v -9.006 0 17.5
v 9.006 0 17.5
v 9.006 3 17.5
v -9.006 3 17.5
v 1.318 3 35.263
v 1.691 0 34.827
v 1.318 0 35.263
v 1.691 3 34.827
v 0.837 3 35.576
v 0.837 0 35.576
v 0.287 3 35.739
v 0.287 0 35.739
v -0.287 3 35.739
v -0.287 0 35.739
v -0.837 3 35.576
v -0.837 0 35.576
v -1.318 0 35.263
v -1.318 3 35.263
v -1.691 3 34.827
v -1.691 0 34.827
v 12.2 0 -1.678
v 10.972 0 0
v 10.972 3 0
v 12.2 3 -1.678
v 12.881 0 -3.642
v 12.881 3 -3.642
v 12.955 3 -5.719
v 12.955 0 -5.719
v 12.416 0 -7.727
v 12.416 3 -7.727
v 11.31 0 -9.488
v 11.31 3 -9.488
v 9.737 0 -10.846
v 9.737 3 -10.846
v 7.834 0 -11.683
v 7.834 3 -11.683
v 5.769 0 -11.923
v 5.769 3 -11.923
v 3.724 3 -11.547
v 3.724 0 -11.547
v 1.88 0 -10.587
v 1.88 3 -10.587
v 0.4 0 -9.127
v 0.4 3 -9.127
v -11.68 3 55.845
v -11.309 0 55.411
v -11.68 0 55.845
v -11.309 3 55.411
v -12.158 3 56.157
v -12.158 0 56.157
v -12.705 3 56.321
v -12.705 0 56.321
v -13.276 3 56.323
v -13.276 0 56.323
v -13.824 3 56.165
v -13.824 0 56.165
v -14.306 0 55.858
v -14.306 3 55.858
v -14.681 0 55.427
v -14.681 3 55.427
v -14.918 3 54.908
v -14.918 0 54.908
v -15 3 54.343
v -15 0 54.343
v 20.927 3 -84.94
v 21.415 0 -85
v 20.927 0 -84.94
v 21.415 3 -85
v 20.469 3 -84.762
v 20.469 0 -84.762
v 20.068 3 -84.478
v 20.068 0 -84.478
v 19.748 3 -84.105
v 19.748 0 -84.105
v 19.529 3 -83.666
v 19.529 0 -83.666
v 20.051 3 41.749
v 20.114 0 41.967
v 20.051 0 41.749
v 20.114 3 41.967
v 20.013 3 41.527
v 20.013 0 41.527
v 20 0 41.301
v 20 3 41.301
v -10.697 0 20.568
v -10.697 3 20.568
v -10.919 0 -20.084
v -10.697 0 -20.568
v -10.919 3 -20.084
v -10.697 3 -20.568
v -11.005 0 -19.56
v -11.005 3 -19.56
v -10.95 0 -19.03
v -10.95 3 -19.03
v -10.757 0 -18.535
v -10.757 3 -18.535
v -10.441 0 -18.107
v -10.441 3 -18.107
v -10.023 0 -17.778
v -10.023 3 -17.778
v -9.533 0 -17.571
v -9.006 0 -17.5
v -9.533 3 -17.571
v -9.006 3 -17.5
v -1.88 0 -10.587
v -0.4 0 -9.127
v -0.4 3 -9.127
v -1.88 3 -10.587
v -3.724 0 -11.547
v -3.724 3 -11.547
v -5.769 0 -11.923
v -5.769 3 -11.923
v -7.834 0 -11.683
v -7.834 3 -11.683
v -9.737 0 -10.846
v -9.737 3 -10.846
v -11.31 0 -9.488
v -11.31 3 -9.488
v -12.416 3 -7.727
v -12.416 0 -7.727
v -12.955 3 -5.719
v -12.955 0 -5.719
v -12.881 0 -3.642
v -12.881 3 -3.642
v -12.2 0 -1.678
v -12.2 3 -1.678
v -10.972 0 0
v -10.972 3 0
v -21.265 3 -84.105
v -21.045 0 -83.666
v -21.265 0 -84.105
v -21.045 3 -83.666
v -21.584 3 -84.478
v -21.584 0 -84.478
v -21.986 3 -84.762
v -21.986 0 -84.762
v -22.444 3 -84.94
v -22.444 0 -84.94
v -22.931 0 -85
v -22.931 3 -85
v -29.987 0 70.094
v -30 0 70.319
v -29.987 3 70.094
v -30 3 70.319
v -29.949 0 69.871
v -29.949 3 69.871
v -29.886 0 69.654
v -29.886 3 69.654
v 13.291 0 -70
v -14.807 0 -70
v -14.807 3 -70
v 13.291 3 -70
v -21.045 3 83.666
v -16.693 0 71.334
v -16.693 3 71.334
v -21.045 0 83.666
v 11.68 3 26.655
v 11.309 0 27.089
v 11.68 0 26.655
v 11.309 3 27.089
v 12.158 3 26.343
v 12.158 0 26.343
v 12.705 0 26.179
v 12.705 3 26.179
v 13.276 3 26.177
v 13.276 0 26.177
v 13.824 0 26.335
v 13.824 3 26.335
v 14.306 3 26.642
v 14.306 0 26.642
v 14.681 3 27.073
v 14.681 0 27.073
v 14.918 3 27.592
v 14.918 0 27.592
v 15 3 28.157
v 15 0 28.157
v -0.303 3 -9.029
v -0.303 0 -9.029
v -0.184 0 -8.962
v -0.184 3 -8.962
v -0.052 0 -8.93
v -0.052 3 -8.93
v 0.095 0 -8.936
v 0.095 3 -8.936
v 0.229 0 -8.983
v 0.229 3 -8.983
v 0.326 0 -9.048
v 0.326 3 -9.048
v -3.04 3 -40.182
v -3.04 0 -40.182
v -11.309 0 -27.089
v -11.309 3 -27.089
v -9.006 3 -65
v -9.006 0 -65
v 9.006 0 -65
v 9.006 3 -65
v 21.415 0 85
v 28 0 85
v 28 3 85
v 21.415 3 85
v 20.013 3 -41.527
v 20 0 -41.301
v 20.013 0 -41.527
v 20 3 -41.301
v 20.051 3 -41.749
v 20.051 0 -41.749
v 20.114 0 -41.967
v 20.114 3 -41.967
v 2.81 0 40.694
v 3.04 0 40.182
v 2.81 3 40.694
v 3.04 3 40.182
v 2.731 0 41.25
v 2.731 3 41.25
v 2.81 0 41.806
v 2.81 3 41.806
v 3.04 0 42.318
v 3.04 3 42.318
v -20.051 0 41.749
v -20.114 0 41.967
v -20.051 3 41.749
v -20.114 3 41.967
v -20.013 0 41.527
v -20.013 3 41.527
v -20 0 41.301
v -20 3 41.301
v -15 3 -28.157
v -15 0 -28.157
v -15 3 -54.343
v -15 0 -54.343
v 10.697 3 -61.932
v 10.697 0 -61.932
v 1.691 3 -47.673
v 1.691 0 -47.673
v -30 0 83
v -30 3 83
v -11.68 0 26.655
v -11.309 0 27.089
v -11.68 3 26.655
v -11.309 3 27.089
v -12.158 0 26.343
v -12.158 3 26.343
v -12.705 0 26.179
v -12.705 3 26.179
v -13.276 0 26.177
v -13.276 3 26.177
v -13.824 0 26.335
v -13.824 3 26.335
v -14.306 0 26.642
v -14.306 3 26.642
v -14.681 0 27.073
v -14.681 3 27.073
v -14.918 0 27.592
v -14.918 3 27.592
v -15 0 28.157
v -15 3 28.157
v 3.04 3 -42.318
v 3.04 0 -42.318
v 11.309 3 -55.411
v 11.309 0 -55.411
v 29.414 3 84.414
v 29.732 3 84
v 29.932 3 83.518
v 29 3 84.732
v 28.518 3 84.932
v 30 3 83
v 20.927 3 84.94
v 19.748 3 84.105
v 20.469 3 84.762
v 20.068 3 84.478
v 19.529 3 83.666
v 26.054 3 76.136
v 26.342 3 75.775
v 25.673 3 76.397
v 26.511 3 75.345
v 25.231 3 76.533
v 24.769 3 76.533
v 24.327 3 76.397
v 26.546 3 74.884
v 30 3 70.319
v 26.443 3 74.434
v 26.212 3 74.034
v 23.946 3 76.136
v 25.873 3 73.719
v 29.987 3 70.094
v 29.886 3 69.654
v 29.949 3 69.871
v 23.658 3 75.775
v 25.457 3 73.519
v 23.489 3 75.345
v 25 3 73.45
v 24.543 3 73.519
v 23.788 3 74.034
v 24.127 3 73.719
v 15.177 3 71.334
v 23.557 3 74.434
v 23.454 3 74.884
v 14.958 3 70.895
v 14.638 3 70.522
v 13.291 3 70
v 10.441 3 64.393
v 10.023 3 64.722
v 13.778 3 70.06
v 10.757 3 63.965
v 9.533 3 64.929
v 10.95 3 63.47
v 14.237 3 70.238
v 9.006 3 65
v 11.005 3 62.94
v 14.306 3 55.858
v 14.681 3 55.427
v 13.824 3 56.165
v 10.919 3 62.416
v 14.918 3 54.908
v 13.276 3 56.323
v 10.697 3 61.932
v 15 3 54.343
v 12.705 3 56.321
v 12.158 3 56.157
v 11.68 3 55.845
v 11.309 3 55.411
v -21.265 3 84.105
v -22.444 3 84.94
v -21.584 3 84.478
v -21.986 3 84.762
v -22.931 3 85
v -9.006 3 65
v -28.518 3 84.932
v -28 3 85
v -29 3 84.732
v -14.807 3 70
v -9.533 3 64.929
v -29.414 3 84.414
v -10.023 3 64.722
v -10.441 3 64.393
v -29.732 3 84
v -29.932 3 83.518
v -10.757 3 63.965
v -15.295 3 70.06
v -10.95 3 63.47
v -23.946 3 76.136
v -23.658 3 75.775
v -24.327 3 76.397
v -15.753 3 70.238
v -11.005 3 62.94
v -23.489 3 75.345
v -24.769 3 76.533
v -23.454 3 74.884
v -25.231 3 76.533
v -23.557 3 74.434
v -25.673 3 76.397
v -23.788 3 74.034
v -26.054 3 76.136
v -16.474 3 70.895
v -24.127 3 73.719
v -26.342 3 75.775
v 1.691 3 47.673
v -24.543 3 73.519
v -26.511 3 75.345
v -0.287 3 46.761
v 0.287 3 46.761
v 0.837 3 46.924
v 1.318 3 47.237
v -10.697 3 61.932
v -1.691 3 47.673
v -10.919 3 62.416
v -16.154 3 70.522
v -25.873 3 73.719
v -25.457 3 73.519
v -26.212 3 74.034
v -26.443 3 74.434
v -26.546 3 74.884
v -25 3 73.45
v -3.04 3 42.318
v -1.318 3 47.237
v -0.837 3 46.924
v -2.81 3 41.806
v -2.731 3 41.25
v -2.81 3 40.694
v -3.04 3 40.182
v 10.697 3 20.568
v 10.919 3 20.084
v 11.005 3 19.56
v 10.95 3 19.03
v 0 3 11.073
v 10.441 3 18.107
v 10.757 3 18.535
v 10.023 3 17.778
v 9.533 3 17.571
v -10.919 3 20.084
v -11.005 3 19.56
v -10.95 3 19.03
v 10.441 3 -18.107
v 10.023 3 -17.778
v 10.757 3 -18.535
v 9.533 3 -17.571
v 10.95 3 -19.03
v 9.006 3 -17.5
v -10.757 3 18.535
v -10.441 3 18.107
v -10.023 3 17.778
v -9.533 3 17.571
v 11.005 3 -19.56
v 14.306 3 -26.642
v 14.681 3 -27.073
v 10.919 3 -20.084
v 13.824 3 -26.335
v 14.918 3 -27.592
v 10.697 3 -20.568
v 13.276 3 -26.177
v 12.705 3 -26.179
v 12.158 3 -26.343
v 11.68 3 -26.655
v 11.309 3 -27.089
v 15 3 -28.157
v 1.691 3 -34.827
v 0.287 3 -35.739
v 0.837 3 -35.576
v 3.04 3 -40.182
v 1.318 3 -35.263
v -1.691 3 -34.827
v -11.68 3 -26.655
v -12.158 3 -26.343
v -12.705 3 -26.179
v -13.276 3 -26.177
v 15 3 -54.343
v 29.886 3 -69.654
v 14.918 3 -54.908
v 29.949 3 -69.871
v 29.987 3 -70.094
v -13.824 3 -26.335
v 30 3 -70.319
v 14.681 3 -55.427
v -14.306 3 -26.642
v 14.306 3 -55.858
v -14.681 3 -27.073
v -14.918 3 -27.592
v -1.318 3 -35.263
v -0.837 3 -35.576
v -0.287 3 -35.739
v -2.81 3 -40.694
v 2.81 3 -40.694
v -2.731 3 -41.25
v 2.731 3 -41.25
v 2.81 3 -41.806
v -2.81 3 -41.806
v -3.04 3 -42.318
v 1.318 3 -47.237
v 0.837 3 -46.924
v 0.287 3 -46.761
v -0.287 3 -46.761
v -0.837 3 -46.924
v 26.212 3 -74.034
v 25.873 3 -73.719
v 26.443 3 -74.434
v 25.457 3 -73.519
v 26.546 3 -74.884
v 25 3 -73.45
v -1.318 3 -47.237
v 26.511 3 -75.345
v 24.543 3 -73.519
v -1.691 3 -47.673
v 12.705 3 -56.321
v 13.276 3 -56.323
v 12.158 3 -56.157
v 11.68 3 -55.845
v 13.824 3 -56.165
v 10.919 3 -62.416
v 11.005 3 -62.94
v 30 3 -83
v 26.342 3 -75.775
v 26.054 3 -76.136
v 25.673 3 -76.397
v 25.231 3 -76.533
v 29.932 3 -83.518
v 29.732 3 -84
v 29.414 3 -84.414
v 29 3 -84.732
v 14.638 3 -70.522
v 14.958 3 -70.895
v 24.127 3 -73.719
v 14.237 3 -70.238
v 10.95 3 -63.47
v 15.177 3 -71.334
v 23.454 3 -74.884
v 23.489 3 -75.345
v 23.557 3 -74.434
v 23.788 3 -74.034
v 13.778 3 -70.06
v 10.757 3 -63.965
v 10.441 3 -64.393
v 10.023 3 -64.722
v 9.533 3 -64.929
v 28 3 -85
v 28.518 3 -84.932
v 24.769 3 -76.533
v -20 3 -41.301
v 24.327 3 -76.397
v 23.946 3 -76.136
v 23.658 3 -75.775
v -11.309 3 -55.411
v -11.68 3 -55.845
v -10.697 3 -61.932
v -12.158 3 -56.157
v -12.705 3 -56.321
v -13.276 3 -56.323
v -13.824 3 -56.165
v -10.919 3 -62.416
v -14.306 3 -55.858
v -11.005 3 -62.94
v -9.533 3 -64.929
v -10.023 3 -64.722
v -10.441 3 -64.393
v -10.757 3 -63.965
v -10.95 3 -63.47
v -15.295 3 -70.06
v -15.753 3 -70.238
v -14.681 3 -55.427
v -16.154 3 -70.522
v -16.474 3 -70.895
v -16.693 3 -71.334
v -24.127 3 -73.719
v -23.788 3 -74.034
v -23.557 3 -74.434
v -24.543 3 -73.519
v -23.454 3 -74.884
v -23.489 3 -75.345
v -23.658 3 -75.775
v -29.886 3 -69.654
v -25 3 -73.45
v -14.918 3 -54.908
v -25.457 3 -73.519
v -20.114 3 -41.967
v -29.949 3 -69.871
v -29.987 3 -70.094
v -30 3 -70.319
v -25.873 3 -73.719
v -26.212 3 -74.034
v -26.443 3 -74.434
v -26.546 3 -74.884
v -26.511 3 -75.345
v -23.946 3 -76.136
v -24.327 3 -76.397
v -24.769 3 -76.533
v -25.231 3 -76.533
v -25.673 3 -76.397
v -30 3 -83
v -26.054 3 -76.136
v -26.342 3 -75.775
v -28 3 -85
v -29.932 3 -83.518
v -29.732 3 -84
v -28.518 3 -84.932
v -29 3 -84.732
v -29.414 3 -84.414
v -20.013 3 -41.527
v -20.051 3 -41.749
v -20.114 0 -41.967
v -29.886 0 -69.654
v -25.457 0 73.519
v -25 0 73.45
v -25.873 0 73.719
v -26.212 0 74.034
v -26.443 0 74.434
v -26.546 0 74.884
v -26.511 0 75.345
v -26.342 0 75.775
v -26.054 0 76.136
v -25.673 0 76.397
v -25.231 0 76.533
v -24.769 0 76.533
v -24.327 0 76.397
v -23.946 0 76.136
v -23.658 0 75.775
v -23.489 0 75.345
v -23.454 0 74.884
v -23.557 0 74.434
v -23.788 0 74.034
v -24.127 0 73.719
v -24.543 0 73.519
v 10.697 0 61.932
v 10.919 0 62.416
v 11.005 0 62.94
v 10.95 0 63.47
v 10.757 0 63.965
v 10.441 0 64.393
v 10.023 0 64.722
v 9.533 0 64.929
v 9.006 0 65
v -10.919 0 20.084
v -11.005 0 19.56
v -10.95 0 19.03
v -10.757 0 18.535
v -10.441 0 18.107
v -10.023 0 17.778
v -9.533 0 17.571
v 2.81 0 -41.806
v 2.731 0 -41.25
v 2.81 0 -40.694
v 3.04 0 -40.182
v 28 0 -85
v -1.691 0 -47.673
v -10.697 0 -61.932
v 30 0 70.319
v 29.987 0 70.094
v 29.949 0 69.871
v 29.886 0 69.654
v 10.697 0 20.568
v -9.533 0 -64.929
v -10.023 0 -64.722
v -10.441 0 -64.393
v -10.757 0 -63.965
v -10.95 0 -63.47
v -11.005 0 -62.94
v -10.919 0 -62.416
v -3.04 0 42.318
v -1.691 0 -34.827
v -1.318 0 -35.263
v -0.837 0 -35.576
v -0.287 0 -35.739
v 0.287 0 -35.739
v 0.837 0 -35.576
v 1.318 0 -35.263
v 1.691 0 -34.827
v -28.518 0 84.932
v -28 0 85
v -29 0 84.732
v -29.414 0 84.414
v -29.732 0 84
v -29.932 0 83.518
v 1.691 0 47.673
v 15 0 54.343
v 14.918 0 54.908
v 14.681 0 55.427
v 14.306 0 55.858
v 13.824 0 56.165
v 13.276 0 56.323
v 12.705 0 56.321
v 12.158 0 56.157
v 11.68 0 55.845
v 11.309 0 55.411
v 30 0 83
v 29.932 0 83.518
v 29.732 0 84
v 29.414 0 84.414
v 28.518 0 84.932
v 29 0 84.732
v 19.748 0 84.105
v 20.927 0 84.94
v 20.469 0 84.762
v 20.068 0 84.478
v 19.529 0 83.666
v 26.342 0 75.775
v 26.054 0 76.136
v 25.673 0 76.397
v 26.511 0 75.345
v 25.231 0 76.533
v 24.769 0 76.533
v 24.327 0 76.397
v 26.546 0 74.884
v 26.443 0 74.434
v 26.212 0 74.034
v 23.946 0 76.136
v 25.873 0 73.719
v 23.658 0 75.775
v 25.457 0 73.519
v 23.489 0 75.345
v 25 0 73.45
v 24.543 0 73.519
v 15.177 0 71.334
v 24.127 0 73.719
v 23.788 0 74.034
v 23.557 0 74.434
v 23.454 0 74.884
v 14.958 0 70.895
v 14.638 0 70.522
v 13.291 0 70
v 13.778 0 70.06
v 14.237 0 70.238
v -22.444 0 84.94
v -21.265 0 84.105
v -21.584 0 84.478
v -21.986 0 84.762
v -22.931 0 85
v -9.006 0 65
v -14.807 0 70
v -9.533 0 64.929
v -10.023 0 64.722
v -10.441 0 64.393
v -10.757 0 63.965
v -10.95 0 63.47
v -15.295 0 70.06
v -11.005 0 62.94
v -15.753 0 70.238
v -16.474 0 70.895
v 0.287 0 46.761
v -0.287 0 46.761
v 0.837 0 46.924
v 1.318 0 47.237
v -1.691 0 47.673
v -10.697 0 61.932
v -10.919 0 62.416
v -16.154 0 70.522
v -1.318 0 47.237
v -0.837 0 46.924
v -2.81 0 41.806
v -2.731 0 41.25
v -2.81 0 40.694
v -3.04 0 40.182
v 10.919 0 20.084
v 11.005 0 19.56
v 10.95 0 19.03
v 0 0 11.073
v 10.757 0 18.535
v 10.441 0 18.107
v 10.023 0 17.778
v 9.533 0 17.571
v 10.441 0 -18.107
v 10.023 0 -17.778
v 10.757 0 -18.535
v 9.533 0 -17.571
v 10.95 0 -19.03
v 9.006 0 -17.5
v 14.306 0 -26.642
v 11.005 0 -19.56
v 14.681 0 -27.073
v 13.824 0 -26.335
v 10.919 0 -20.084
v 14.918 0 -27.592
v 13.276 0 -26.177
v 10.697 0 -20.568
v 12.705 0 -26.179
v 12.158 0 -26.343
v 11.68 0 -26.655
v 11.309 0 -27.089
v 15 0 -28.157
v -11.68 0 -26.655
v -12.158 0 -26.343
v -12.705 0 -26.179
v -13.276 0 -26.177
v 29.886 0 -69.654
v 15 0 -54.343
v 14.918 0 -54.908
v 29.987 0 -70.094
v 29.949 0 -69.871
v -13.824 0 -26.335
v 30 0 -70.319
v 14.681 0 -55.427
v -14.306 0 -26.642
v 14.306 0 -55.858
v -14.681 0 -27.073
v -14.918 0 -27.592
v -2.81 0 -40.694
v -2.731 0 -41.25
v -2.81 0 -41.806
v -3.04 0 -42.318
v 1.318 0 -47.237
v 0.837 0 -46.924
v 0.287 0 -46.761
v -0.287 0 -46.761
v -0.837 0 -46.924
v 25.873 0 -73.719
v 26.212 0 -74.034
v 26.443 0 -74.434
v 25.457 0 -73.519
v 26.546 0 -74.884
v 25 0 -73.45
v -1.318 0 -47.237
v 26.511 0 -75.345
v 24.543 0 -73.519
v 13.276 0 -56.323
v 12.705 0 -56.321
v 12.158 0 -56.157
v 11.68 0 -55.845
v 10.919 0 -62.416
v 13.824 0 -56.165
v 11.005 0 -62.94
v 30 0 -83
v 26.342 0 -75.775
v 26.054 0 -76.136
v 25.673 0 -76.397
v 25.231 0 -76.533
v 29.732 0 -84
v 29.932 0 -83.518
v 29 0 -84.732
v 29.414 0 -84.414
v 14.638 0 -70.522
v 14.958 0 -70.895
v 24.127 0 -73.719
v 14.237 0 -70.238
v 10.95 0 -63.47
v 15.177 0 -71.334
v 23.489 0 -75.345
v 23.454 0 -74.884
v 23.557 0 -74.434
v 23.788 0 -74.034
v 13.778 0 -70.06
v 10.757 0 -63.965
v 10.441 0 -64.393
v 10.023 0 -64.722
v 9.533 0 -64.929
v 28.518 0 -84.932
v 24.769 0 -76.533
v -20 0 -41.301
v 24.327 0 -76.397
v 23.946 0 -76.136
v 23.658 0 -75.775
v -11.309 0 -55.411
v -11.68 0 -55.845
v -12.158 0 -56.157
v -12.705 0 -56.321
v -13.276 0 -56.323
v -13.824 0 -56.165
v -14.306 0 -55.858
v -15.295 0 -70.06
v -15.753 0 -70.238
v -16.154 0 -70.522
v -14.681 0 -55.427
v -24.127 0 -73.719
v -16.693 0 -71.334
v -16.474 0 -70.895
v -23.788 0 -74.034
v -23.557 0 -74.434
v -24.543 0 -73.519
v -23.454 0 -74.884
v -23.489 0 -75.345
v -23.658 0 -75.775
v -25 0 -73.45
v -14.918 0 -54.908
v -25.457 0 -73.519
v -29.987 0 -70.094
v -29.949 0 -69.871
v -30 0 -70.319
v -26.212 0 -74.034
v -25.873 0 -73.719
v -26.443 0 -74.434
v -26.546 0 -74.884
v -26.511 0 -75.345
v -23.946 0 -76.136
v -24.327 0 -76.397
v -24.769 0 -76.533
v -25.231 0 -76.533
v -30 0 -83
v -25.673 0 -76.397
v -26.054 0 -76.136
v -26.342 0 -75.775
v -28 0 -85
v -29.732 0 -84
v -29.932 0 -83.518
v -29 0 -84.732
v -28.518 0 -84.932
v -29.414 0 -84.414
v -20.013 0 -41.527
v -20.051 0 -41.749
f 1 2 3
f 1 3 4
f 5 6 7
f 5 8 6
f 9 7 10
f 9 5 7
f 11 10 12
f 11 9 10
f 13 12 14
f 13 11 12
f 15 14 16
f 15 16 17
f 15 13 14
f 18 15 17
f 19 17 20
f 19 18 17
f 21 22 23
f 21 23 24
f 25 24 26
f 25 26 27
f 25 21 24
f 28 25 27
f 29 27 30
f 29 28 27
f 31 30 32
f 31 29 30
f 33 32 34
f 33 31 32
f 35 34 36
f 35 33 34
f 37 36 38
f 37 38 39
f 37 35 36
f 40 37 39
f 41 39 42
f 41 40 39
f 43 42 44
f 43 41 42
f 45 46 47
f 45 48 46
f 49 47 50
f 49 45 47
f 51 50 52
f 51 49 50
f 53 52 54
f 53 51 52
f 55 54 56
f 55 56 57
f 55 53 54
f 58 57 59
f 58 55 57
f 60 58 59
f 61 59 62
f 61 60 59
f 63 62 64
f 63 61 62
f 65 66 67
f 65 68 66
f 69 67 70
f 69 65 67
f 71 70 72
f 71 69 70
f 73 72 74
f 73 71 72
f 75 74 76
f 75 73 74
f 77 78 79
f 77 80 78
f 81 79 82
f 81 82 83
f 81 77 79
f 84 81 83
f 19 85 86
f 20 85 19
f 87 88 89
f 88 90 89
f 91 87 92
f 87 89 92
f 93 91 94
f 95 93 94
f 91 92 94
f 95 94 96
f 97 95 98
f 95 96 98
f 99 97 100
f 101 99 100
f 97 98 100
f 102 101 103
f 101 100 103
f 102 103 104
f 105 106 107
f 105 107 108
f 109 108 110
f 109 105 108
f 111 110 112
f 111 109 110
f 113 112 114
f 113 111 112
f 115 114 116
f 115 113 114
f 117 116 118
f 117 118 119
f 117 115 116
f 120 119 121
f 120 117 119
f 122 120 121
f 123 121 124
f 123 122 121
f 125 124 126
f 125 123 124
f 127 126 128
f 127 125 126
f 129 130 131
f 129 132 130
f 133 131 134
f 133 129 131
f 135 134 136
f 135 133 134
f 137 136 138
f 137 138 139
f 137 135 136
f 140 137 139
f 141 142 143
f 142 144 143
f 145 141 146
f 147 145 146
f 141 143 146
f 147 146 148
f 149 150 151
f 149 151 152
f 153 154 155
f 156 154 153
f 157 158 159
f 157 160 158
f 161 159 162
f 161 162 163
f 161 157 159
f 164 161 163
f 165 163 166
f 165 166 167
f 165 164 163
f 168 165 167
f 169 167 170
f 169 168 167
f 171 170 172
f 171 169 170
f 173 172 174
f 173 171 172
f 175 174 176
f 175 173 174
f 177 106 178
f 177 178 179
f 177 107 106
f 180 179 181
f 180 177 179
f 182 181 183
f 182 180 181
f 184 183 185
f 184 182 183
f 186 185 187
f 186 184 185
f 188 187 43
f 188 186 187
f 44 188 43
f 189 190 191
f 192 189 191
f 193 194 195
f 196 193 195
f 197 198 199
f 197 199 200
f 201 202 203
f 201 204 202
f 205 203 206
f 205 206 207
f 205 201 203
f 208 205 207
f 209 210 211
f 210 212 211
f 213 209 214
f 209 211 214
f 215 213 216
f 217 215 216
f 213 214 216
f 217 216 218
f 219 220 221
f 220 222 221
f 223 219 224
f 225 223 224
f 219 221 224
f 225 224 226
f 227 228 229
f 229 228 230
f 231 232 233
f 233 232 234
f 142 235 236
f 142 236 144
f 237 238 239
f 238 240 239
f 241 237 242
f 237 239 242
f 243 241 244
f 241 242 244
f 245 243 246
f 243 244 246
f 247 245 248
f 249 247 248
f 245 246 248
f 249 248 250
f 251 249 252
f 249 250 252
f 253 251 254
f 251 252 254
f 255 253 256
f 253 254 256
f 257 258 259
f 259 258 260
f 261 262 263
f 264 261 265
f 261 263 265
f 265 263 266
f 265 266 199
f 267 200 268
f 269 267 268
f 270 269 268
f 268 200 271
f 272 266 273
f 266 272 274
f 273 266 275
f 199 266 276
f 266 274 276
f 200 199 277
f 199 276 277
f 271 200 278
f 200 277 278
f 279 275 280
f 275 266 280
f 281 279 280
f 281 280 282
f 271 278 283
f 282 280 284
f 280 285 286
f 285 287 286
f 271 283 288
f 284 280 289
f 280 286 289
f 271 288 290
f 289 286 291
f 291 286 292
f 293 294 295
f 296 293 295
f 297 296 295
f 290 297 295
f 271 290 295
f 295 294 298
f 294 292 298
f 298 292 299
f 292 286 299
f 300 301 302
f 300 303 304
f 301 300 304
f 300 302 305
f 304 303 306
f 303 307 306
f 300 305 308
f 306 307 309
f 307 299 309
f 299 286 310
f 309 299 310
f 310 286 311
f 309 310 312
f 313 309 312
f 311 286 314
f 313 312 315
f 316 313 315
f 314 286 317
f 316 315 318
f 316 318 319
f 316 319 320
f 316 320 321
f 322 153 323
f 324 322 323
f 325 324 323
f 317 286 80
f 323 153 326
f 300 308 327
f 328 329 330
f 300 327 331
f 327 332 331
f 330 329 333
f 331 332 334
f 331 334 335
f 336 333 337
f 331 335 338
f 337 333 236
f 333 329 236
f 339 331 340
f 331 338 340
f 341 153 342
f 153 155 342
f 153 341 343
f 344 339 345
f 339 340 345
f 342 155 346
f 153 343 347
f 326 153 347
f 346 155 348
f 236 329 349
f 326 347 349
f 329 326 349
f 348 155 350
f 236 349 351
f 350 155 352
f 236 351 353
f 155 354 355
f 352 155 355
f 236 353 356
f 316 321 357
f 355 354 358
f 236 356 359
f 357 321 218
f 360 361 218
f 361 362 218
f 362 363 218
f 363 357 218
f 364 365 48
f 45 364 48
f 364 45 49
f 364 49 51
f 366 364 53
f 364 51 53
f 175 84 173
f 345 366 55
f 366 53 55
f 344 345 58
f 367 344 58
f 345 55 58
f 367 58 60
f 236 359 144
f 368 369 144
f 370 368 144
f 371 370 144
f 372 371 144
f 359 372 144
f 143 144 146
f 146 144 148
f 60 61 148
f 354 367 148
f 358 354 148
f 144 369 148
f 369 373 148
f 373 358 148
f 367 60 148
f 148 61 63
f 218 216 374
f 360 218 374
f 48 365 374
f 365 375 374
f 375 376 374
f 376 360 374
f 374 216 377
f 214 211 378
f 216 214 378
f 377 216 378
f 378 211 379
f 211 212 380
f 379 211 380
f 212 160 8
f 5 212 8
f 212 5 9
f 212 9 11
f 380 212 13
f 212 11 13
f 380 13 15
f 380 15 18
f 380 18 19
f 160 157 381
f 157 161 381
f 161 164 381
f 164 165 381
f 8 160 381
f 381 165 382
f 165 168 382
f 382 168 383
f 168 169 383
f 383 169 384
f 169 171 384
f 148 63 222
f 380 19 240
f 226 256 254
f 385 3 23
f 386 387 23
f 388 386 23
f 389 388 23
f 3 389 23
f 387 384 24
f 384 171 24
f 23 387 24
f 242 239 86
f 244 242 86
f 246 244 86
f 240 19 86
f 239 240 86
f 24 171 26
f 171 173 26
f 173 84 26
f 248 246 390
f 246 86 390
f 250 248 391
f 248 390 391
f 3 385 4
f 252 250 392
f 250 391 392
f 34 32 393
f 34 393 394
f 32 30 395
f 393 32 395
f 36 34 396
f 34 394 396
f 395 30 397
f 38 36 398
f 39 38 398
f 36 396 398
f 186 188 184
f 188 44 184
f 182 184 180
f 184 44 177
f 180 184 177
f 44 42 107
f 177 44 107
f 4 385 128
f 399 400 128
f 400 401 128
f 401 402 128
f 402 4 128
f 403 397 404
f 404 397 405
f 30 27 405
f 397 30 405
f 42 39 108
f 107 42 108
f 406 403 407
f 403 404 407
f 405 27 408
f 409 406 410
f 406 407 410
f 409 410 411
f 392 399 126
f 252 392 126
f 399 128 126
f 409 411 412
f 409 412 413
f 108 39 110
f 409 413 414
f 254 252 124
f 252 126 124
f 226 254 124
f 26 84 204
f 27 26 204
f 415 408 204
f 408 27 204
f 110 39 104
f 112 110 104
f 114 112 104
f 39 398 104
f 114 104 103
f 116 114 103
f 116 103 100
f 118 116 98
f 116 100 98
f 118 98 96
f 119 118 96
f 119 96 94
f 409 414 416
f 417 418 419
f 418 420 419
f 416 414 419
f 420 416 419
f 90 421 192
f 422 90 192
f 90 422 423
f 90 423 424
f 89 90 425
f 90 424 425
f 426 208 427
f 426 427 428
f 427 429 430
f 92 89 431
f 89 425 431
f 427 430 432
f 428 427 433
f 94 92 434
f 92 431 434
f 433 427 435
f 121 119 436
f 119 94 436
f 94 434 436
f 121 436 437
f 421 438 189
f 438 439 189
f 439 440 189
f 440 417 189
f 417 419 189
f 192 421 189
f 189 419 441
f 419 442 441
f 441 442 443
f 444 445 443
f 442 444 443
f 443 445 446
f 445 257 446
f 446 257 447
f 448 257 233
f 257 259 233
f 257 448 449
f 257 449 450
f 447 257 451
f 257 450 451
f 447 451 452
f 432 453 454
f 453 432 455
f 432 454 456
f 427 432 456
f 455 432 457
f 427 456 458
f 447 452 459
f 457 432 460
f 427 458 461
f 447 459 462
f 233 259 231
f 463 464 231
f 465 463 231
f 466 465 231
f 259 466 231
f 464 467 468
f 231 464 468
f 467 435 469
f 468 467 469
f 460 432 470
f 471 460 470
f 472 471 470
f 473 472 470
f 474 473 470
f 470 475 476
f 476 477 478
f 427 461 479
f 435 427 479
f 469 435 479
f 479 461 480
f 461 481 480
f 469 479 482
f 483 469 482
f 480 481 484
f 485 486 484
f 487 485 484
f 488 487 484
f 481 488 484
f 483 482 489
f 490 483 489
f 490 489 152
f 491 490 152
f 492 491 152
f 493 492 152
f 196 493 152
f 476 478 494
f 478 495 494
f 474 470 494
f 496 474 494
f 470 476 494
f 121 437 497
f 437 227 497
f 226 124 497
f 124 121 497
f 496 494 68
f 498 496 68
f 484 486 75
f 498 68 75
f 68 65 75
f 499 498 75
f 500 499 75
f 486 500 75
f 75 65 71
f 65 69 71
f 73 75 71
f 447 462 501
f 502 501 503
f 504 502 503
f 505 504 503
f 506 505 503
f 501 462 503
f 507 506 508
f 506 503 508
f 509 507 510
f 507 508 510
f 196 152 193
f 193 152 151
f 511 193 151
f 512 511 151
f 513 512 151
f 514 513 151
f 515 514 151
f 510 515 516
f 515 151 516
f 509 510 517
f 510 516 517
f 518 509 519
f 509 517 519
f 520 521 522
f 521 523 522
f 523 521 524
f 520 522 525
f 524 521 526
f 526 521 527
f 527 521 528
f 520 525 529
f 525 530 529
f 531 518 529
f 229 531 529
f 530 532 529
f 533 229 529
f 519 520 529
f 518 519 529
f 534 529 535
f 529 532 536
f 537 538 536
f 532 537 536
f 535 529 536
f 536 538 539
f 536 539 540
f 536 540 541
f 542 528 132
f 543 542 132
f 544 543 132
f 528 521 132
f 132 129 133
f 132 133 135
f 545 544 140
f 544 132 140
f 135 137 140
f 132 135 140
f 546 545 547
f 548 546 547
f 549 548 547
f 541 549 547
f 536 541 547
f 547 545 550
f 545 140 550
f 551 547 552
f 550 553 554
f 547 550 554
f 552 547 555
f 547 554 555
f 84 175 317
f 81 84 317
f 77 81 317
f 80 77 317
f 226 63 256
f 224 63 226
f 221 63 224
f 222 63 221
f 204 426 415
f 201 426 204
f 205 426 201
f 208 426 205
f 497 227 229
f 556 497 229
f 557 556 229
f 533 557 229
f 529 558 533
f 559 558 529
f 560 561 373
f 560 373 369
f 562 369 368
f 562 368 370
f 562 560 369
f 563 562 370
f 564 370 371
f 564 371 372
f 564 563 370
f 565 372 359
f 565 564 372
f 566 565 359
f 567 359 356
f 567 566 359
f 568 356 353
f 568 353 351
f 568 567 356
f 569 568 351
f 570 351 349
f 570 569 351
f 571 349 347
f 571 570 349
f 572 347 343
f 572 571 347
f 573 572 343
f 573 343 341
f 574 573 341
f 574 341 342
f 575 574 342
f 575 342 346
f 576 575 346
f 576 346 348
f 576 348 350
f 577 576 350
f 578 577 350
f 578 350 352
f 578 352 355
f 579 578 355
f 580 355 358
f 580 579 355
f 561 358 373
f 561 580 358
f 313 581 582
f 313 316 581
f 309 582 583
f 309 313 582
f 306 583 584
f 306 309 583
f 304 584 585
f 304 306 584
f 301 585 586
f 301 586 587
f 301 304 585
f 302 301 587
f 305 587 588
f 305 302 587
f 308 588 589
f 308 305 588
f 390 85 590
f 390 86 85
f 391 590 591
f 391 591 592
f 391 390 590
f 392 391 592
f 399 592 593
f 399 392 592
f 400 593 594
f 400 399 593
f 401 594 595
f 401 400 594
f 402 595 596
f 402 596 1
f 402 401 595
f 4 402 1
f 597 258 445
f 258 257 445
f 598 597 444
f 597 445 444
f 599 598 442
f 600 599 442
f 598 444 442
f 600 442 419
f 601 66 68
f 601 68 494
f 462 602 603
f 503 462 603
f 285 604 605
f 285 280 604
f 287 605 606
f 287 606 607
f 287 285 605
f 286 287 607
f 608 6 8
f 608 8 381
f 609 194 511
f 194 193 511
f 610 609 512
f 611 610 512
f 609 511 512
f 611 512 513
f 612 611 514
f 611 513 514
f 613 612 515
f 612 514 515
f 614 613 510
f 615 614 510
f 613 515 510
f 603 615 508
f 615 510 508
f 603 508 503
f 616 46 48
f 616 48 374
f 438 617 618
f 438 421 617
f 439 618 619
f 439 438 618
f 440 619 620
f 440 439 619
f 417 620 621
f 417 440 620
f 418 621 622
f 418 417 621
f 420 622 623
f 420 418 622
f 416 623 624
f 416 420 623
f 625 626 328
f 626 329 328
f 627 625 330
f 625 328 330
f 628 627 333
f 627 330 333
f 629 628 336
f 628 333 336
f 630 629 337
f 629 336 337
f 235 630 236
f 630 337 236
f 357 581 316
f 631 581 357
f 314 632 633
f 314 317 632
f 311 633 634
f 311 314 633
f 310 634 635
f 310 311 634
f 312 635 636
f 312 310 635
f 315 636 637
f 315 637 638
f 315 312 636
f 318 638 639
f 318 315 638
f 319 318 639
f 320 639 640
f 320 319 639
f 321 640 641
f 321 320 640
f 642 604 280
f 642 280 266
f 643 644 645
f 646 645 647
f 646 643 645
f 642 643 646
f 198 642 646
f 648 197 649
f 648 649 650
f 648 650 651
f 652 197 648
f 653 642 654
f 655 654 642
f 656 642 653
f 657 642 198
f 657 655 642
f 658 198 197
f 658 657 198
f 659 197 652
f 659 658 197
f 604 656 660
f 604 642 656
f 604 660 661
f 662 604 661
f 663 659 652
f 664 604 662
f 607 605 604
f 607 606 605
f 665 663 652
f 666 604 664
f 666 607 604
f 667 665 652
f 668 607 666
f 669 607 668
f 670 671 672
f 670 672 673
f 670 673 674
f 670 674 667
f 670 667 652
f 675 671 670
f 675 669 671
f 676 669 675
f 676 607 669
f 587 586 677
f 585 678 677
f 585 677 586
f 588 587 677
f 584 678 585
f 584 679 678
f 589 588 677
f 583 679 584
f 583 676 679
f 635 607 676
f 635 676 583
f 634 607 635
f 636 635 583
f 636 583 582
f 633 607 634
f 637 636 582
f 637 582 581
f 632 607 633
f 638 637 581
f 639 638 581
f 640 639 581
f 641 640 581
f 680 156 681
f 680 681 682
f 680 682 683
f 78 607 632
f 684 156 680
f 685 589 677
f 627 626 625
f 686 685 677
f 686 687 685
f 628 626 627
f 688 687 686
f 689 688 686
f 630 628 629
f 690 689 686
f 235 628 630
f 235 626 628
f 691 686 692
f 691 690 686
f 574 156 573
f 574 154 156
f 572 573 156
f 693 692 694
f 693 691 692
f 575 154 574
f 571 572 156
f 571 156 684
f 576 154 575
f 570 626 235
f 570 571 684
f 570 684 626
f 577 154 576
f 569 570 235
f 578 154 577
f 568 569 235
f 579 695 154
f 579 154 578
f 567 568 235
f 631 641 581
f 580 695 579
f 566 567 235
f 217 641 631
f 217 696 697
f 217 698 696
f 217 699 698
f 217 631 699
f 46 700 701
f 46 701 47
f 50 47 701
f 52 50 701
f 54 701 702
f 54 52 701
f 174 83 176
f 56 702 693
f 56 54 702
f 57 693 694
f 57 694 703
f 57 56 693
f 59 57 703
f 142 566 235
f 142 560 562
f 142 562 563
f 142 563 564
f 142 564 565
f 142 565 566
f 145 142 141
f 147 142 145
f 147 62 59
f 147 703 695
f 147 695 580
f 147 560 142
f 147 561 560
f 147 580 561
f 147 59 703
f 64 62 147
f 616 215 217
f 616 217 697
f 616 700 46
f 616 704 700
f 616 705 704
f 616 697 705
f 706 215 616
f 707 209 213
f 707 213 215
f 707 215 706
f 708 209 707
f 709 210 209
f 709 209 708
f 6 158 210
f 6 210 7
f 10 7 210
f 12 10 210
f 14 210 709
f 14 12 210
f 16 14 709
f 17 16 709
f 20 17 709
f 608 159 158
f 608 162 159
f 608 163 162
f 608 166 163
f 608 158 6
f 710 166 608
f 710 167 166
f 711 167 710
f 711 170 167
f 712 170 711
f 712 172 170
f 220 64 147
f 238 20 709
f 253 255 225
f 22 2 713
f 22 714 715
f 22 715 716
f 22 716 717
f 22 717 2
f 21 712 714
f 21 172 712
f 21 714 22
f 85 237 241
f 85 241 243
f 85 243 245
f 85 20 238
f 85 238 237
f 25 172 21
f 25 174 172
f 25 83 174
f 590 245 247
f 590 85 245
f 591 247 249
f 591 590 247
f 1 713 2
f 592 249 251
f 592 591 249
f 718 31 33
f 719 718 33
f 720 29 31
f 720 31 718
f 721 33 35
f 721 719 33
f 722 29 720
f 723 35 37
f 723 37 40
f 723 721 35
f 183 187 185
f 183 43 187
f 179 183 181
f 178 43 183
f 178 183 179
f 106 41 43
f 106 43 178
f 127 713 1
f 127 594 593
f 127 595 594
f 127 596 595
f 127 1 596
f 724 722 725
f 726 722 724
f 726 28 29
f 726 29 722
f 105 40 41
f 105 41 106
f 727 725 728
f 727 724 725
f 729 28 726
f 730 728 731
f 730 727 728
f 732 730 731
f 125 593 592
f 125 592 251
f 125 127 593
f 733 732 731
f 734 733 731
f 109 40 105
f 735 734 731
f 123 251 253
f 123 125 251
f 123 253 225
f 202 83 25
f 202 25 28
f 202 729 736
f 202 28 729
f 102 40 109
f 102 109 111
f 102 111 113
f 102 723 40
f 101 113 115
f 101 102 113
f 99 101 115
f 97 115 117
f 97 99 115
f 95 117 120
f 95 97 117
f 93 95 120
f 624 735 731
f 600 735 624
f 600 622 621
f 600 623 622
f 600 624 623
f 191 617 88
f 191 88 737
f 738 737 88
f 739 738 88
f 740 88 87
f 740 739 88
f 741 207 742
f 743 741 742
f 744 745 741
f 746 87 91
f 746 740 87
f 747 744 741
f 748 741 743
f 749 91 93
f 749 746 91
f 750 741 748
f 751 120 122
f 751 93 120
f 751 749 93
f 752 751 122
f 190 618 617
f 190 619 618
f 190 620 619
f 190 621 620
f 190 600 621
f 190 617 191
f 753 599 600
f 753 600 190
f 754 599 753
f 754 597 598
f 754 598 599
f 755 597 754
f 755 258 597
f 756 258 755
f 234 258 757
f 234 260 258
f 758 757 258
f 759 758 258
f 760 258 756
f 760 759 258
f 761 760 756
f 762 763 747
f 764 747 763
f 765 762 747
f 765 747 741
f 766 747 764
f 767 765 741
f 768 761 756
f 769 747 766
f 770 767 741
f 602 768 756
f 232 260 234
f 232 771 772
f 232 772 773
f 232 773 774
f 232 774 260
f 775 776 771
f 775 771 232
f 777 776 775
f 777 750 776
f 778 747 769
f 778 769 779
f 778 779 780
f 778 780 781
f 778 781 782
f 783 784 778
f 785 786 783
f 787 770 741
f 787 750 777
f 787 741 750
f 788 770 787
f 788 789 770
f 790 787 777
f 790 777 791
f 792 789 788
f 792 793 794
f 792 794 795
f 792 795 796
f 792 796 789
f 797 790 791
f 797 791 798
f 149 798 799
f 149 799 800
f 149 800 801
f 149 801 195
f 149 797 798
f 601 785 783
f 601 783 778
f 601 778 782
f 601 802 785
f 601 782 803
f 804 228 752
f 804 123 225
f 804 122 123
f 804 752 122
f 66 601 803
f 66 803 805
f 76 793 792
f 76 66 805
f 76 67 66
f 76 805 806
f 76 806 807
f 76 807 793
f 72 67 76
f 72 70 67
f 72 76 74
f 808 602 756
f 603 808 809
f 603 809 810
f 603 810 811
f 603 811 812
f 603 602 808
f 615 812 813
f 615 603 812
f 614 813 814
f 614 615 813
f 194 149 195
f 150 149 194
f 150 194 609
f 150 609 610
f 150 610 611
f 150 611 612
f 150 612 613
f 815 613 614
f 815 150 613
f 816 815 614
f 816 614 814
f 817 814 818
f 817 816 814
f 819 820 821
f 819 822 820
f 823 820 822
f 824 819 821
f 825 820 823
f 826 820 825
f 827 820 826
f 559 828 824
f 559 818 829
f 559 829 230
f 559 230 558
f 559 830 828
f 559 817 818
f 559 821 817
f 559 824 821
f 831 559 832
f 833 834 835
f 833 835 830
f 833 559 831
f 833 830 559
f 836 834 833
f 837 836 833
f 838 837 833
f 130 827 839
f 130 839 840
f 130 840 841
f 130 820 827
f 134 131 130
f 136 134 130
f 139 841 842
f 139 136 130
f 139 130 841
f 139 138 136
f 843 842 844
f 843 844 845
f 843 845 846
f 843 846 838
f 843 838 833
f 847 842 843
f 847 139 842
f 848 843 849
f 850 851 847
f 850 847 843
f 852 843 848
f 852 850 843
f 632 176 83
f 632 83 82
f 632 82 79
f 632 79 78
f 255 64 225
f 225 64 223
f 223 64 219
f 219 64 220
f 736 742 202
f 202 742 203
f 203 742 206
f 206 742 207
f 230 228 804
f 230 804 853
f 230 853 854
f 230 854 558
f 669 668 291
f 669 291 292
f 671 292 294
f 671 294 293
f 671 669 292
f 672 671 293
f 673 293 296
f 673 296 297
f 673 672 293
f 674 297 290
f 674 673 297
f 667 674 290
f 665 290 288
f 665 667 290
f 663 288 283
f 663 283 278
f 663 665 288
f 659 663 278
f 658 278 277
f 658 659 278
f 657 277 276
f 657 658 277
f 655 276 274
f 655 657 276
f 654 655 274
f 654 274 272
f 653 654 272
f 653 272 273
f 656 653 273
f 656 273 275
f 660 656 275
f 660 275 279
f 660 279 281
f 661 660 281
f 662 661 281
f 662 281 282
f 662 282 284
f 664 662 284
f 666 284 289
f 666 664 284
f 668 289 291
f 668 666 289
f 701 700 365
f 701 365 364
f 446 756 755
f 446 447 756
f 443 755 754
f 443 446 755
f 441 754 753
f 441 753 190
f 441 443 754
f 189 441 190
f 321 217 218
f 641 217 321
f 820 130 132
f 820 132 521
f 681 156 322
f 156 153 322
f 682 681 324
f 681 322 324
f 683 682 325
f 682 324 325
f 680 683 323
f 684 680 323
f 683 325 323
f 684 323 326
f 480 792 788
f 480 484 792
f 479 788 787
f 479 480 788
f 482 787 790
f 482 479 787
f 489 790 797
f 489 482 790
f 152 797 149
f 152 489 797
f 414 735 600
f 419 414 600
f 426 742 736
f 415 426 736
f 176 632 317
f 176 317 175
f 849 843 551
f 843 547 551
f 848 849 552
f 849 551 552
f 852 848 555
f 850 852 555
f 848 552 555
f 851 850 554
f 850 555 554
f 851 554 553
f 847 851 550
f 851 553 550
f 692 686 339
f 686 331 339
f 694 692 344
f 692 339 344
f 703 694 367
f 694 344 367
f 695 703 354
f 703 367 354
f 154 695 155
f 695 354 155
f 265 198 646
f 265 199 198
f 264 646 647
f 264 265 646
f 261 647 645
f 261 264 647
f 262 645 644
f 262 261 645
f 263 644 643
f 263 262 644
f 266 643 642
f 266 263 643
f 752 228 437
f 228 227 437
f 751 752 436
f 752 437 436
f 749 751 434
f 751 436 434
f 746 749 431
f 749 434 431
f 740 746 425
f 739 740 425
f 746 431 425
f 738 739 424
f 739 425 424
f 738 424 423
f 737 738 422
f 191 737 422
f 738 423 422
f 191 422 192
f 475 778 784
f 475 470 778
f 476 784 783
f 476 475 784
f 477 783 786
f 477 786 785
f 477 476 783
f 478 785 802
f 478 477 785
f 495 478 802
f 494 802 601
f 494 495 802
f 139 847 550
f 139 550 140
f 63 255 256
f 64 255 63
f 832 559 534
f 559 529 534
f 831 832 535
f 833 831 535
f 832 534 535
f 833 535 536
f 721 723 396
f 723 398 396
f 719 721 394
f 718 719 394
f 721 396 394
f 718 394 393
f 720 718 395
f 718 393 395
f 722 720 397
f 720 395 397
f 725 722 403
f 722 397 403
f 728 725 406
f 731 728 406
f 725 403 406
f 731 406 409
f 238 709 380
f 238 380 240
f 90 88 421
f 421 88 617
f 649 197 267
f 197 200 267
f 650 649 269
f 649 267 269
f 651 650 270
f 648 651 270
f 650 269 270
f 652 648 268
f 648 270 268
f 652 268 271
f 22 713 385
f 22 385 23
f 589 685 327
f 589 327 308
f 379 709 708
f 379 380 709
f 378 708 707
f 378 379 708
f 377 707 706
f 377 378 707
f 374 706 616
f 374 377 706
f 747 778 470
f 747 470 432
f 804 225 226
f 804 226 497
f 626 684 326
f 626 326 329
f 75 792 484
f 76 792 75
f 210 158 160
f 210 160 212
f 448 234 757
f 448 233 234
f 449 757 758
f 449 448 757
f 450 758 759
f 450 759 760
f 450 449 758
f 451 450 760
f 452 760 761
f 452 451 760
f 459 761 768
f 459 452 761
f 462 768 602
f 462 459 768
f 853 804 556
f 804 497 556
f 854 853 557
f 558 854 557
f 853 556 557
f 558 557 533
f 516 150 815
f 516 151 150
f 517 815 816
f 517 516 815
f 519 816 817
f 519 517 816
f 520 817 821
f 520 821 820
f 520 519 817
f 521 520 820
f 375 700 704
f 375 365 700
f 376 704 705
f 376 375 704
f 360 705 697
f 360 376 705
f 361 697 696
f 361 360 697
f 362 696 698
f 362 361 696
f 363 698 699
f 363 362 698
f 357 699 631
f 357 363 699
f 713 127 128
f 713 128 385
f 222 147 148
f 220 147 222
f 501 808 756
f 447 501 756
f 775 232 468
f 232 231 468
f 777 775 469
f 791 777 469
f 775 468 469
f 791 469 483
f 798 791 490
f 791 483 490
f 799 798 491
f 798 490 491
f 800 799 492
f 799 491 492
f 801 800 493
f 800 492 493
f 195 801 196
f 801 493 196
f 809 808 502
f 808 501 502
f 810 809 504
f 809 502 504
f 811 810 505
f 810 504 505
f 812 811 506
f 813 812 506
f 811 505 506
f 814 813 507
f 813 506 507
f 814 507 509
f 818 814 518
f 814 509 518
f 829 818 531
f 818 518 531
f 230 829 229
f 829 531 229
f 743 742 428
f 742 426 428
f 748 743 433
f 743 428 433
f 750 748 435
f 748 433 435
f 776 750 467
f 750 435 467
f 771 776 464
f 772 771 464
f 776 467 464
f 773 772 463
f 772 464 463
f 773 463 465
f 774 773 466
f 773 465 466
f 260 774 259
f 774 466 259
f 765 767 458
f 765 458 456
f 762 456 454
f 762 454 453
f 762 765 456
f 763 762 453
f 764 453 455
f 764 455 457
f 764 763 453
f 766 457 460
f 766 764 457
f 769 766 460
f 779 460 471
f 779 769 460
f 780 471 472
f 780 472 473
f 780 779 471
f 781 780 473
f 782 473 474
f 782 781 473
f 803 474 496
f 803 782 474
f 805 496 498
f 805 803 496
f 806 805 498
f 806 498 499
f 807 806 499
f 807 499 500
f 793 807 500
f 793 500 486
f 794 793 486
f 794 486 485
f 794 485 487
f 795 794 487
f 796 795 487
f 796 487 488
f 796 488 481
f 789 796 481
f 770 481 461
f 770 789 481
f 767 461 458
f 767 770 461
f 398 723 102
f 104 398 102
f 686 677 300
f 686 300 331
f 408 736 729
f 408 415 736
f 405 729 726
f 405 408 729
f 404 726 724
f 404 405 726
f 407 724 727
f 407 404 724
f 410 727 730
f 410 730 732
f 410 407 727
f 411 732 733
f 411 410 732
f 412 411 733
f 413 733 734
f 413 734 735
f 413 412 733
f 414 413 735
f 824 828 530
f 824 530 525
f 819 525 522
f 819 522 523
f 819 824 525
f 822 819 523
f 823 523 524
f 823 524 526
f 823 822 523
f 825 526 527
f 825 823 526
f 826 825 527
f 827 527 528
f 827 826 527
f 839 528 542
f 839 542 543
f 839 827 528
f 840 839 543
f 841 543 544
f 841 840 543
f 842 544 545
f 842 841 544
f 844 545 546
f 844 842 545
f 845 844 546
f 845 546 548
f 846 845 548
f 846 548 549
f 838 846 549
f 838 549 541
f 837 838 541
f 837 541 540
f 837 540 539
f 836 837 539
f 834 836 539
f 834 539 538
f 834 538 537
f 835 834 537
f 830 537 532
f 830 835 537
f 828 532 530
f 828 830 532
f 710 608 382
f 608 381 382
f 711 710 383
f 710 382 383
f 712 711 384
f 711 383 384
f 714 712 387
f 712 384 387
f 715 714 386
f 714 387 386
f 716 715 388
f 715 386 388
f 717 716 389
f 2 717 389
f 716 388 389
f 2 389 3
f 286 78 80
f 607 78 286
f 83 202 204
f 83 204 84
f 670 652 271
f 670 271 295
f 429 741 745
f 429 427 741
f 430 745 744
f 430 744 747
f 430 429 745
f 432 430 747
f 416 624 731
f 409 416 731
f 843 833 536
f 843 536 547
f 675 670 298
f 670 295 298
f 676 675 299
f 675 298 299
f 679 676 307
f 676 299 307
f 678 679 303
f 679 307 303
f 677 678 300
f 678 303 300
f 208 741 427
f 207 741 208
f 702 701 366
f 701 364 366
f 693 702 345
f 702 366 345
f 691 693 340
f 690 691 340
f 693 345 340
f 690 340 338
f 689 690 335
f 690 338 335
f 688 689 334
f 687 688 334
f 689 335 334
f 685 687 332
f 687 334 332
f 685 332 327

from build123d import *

# Parameters (mm, degrees)
SKETCH_1_R      = 1.55
EXTRUDE_1_DEPTH = 3
FILLET_1_R      = 2
FILLET_2_R      = 0.5


with BuildPart() as part:
    # 草图1 → 凸台-拉伸1 (new body)
    with BuildSketch(Plane(origin=(0, 0, 0), x_dir=(1, 0, 0), z_dir=(0, 1, 0))):
        Polygon((30, -85), (20, -85), (14.705882353, -70), (-16.222232293, -70), (-21.51634994, -85), (-30, -85), (-30, -69.976869686), (-20, -41.643536352), (-20, 41.643536352), (-30, 69.976869686), (-30, 85), (-21.51634994, 85), (-16.222232293, 70), (14.705882353, 70), (20, 85), (30, 85), (30, 69.976869686), (20, 41.643536352), (20, -41.643536352), (30, -69.976869686), align=None)
        with Locations(Location((-25, 75, 0), (0, 0, 270))):
            Circle(SKETCH_1_R, mode=Mode.SUBTRACT)
        with Locations(Location((25, 75, 0), (0, 0, 270))):
            Circle(SKETCH_1_R, mode=Mode.SUBTRACT)
        with Locations(Location((25, -75, 0), (0, 0, 90))):
            Circle(SKETCH_1_R, mode=Mode.SUBTRACT)
        with Locations(Location((-25, -75, 0), (0, 0, 90))):
            Circle(SKETCH_1_R, mode=Mode.SUBTRACT)
        with BuildLine():
            Line((-10.97228498, 0), (0, -11.072893133))
            Line((0, -11.072893133), (10.97228498, 0))
            ThreePointArc((10.97228498, 0), (10.2971634, 10.452899726), (0, 8.532658143))
            ThreePointArc((0, 8.532658143), (-10.2971634, 10.452899726), (-10.97228498, 0))
        make_face(mode=Mode.SUBTRACT)
        Polygon((12.634504731, 65), (0, 44.995367509), (-12.634504731, 65), align=None, mode=Mode.SUBTRACT)
        Polygon((-12.634504731, 17.5), (0, 37.504632491), (12.634504731, 17.5), align=None, mode=Mode.SUBTRACT)
        Polygon((-15, 61.254632491), (-2.365495269, 41.25), (-15, 21.245367509), align=None, mode=Mode.SUBTRACT)
        Polygon((15, 61.254632491), (15, 21.245367509), (2.365495269, 41.25), align=None, mode=Mode.SUBTRACT)
        Polygon((2.365495269, -41.25), (15, -61.254632491), (15, -21.245367509), align=None, mode=Mode.SUBTRACT)
        Polygon((-12.634504731, -65), (12.634504731, -65), (0, -44.995367509), align=None, mode=Mode.SUBTRACT)
        Polygon((-15, -21.245367509), (-15, -61.254632491), (-2.365495269, -41.25), align=None, mode=Mode.SUBTRACT)
        Polygon((12.634504731, -17.5), (-12.634504731, -17.5), (0, -37.504632491), align=None, mode=Mode.SUBTRACT)
    extrude(amount=EXTRUDE_1_DEPTH)

    # 圆角1
    fillet_1_edges = [part.edges().sort_by_distance(p)[0] for p in [
        (-15, 1.5, -21.245367509),
        (-2.365495269, 1.5, -41.25),
        (-15, 1.5, -61.254632491),
        (-12.634504731, 1.5, -17.5),
        (12.634504731, 1.5, -17.5),
        (0, 1.5, -37.504632491),
        (0, 1.5, 44.995367509),
        (-12.634504731, 1.5, 65),
        (12.634504731, 1.5, 65),
        (-2.365495269, 1.5, 41.25),
        (-15, 1.5, 21.245367509),
        (-15, 1.5, 61.254632491),
        (0, 1.5, 37.504632491),
        (12.634504731, 1.5, 17.5),
        (-12.634504731, 1.5, 17.5),
        (-21.51634994, 1.5, -85),
        (-16.222232293, 1.5, -70),
        (14.705882353, 1.5, -70),
        (20, 1.5, -85),
        (30, 1.5, -85),
        (30, 1.5, -69.976869686),
        (20, 1.5, -41.643536352),
        (20, 1.5, 41.643536352),
        (30, 1.5, 69.976869686),
        (30, 1.5, 85),
        (20, 1.5, 85),
        (14.705882353, 1.5, 70),
        (-16.222232293, 1.5, 70),
        (-21.51634994, 1.5, 85),
        (-30, 1.5, 85),
        (-30, 1.5, 69.976869686),
        (-20, 1.5, 41.643536352),
        (-20, 1.5, -41.643536352),
        (-30, 1.5, -69.976869686),
        (-30, 1.5, -85),
        (15, 1.5, 21.245367509),
        (2.365495269, 1.5, 41.25),
        (15, 1.5, 61.254632491),
        (15, 1.5, -61.254632491),
        (2.365495269, 1.5, -41.25),
        (15, 1.5, -21.245367509),
        (-12.634504731, 1.5, -65),
        (0, 1.5, -44.995367509),
        (12.634504731, 1.5, -65),
    ]]
    fillet(fillet_1_edges, radius=FILLET_1_R)

    # 圆角2
    fillet_2_edges = [part.edges().sort_by_distance(p)[0] for p in [
        (0, 1.5, -8.532658143),
    ]]
    fillet(fillet_2_edges, radius=FILLET_2_R)


solid = part.part
